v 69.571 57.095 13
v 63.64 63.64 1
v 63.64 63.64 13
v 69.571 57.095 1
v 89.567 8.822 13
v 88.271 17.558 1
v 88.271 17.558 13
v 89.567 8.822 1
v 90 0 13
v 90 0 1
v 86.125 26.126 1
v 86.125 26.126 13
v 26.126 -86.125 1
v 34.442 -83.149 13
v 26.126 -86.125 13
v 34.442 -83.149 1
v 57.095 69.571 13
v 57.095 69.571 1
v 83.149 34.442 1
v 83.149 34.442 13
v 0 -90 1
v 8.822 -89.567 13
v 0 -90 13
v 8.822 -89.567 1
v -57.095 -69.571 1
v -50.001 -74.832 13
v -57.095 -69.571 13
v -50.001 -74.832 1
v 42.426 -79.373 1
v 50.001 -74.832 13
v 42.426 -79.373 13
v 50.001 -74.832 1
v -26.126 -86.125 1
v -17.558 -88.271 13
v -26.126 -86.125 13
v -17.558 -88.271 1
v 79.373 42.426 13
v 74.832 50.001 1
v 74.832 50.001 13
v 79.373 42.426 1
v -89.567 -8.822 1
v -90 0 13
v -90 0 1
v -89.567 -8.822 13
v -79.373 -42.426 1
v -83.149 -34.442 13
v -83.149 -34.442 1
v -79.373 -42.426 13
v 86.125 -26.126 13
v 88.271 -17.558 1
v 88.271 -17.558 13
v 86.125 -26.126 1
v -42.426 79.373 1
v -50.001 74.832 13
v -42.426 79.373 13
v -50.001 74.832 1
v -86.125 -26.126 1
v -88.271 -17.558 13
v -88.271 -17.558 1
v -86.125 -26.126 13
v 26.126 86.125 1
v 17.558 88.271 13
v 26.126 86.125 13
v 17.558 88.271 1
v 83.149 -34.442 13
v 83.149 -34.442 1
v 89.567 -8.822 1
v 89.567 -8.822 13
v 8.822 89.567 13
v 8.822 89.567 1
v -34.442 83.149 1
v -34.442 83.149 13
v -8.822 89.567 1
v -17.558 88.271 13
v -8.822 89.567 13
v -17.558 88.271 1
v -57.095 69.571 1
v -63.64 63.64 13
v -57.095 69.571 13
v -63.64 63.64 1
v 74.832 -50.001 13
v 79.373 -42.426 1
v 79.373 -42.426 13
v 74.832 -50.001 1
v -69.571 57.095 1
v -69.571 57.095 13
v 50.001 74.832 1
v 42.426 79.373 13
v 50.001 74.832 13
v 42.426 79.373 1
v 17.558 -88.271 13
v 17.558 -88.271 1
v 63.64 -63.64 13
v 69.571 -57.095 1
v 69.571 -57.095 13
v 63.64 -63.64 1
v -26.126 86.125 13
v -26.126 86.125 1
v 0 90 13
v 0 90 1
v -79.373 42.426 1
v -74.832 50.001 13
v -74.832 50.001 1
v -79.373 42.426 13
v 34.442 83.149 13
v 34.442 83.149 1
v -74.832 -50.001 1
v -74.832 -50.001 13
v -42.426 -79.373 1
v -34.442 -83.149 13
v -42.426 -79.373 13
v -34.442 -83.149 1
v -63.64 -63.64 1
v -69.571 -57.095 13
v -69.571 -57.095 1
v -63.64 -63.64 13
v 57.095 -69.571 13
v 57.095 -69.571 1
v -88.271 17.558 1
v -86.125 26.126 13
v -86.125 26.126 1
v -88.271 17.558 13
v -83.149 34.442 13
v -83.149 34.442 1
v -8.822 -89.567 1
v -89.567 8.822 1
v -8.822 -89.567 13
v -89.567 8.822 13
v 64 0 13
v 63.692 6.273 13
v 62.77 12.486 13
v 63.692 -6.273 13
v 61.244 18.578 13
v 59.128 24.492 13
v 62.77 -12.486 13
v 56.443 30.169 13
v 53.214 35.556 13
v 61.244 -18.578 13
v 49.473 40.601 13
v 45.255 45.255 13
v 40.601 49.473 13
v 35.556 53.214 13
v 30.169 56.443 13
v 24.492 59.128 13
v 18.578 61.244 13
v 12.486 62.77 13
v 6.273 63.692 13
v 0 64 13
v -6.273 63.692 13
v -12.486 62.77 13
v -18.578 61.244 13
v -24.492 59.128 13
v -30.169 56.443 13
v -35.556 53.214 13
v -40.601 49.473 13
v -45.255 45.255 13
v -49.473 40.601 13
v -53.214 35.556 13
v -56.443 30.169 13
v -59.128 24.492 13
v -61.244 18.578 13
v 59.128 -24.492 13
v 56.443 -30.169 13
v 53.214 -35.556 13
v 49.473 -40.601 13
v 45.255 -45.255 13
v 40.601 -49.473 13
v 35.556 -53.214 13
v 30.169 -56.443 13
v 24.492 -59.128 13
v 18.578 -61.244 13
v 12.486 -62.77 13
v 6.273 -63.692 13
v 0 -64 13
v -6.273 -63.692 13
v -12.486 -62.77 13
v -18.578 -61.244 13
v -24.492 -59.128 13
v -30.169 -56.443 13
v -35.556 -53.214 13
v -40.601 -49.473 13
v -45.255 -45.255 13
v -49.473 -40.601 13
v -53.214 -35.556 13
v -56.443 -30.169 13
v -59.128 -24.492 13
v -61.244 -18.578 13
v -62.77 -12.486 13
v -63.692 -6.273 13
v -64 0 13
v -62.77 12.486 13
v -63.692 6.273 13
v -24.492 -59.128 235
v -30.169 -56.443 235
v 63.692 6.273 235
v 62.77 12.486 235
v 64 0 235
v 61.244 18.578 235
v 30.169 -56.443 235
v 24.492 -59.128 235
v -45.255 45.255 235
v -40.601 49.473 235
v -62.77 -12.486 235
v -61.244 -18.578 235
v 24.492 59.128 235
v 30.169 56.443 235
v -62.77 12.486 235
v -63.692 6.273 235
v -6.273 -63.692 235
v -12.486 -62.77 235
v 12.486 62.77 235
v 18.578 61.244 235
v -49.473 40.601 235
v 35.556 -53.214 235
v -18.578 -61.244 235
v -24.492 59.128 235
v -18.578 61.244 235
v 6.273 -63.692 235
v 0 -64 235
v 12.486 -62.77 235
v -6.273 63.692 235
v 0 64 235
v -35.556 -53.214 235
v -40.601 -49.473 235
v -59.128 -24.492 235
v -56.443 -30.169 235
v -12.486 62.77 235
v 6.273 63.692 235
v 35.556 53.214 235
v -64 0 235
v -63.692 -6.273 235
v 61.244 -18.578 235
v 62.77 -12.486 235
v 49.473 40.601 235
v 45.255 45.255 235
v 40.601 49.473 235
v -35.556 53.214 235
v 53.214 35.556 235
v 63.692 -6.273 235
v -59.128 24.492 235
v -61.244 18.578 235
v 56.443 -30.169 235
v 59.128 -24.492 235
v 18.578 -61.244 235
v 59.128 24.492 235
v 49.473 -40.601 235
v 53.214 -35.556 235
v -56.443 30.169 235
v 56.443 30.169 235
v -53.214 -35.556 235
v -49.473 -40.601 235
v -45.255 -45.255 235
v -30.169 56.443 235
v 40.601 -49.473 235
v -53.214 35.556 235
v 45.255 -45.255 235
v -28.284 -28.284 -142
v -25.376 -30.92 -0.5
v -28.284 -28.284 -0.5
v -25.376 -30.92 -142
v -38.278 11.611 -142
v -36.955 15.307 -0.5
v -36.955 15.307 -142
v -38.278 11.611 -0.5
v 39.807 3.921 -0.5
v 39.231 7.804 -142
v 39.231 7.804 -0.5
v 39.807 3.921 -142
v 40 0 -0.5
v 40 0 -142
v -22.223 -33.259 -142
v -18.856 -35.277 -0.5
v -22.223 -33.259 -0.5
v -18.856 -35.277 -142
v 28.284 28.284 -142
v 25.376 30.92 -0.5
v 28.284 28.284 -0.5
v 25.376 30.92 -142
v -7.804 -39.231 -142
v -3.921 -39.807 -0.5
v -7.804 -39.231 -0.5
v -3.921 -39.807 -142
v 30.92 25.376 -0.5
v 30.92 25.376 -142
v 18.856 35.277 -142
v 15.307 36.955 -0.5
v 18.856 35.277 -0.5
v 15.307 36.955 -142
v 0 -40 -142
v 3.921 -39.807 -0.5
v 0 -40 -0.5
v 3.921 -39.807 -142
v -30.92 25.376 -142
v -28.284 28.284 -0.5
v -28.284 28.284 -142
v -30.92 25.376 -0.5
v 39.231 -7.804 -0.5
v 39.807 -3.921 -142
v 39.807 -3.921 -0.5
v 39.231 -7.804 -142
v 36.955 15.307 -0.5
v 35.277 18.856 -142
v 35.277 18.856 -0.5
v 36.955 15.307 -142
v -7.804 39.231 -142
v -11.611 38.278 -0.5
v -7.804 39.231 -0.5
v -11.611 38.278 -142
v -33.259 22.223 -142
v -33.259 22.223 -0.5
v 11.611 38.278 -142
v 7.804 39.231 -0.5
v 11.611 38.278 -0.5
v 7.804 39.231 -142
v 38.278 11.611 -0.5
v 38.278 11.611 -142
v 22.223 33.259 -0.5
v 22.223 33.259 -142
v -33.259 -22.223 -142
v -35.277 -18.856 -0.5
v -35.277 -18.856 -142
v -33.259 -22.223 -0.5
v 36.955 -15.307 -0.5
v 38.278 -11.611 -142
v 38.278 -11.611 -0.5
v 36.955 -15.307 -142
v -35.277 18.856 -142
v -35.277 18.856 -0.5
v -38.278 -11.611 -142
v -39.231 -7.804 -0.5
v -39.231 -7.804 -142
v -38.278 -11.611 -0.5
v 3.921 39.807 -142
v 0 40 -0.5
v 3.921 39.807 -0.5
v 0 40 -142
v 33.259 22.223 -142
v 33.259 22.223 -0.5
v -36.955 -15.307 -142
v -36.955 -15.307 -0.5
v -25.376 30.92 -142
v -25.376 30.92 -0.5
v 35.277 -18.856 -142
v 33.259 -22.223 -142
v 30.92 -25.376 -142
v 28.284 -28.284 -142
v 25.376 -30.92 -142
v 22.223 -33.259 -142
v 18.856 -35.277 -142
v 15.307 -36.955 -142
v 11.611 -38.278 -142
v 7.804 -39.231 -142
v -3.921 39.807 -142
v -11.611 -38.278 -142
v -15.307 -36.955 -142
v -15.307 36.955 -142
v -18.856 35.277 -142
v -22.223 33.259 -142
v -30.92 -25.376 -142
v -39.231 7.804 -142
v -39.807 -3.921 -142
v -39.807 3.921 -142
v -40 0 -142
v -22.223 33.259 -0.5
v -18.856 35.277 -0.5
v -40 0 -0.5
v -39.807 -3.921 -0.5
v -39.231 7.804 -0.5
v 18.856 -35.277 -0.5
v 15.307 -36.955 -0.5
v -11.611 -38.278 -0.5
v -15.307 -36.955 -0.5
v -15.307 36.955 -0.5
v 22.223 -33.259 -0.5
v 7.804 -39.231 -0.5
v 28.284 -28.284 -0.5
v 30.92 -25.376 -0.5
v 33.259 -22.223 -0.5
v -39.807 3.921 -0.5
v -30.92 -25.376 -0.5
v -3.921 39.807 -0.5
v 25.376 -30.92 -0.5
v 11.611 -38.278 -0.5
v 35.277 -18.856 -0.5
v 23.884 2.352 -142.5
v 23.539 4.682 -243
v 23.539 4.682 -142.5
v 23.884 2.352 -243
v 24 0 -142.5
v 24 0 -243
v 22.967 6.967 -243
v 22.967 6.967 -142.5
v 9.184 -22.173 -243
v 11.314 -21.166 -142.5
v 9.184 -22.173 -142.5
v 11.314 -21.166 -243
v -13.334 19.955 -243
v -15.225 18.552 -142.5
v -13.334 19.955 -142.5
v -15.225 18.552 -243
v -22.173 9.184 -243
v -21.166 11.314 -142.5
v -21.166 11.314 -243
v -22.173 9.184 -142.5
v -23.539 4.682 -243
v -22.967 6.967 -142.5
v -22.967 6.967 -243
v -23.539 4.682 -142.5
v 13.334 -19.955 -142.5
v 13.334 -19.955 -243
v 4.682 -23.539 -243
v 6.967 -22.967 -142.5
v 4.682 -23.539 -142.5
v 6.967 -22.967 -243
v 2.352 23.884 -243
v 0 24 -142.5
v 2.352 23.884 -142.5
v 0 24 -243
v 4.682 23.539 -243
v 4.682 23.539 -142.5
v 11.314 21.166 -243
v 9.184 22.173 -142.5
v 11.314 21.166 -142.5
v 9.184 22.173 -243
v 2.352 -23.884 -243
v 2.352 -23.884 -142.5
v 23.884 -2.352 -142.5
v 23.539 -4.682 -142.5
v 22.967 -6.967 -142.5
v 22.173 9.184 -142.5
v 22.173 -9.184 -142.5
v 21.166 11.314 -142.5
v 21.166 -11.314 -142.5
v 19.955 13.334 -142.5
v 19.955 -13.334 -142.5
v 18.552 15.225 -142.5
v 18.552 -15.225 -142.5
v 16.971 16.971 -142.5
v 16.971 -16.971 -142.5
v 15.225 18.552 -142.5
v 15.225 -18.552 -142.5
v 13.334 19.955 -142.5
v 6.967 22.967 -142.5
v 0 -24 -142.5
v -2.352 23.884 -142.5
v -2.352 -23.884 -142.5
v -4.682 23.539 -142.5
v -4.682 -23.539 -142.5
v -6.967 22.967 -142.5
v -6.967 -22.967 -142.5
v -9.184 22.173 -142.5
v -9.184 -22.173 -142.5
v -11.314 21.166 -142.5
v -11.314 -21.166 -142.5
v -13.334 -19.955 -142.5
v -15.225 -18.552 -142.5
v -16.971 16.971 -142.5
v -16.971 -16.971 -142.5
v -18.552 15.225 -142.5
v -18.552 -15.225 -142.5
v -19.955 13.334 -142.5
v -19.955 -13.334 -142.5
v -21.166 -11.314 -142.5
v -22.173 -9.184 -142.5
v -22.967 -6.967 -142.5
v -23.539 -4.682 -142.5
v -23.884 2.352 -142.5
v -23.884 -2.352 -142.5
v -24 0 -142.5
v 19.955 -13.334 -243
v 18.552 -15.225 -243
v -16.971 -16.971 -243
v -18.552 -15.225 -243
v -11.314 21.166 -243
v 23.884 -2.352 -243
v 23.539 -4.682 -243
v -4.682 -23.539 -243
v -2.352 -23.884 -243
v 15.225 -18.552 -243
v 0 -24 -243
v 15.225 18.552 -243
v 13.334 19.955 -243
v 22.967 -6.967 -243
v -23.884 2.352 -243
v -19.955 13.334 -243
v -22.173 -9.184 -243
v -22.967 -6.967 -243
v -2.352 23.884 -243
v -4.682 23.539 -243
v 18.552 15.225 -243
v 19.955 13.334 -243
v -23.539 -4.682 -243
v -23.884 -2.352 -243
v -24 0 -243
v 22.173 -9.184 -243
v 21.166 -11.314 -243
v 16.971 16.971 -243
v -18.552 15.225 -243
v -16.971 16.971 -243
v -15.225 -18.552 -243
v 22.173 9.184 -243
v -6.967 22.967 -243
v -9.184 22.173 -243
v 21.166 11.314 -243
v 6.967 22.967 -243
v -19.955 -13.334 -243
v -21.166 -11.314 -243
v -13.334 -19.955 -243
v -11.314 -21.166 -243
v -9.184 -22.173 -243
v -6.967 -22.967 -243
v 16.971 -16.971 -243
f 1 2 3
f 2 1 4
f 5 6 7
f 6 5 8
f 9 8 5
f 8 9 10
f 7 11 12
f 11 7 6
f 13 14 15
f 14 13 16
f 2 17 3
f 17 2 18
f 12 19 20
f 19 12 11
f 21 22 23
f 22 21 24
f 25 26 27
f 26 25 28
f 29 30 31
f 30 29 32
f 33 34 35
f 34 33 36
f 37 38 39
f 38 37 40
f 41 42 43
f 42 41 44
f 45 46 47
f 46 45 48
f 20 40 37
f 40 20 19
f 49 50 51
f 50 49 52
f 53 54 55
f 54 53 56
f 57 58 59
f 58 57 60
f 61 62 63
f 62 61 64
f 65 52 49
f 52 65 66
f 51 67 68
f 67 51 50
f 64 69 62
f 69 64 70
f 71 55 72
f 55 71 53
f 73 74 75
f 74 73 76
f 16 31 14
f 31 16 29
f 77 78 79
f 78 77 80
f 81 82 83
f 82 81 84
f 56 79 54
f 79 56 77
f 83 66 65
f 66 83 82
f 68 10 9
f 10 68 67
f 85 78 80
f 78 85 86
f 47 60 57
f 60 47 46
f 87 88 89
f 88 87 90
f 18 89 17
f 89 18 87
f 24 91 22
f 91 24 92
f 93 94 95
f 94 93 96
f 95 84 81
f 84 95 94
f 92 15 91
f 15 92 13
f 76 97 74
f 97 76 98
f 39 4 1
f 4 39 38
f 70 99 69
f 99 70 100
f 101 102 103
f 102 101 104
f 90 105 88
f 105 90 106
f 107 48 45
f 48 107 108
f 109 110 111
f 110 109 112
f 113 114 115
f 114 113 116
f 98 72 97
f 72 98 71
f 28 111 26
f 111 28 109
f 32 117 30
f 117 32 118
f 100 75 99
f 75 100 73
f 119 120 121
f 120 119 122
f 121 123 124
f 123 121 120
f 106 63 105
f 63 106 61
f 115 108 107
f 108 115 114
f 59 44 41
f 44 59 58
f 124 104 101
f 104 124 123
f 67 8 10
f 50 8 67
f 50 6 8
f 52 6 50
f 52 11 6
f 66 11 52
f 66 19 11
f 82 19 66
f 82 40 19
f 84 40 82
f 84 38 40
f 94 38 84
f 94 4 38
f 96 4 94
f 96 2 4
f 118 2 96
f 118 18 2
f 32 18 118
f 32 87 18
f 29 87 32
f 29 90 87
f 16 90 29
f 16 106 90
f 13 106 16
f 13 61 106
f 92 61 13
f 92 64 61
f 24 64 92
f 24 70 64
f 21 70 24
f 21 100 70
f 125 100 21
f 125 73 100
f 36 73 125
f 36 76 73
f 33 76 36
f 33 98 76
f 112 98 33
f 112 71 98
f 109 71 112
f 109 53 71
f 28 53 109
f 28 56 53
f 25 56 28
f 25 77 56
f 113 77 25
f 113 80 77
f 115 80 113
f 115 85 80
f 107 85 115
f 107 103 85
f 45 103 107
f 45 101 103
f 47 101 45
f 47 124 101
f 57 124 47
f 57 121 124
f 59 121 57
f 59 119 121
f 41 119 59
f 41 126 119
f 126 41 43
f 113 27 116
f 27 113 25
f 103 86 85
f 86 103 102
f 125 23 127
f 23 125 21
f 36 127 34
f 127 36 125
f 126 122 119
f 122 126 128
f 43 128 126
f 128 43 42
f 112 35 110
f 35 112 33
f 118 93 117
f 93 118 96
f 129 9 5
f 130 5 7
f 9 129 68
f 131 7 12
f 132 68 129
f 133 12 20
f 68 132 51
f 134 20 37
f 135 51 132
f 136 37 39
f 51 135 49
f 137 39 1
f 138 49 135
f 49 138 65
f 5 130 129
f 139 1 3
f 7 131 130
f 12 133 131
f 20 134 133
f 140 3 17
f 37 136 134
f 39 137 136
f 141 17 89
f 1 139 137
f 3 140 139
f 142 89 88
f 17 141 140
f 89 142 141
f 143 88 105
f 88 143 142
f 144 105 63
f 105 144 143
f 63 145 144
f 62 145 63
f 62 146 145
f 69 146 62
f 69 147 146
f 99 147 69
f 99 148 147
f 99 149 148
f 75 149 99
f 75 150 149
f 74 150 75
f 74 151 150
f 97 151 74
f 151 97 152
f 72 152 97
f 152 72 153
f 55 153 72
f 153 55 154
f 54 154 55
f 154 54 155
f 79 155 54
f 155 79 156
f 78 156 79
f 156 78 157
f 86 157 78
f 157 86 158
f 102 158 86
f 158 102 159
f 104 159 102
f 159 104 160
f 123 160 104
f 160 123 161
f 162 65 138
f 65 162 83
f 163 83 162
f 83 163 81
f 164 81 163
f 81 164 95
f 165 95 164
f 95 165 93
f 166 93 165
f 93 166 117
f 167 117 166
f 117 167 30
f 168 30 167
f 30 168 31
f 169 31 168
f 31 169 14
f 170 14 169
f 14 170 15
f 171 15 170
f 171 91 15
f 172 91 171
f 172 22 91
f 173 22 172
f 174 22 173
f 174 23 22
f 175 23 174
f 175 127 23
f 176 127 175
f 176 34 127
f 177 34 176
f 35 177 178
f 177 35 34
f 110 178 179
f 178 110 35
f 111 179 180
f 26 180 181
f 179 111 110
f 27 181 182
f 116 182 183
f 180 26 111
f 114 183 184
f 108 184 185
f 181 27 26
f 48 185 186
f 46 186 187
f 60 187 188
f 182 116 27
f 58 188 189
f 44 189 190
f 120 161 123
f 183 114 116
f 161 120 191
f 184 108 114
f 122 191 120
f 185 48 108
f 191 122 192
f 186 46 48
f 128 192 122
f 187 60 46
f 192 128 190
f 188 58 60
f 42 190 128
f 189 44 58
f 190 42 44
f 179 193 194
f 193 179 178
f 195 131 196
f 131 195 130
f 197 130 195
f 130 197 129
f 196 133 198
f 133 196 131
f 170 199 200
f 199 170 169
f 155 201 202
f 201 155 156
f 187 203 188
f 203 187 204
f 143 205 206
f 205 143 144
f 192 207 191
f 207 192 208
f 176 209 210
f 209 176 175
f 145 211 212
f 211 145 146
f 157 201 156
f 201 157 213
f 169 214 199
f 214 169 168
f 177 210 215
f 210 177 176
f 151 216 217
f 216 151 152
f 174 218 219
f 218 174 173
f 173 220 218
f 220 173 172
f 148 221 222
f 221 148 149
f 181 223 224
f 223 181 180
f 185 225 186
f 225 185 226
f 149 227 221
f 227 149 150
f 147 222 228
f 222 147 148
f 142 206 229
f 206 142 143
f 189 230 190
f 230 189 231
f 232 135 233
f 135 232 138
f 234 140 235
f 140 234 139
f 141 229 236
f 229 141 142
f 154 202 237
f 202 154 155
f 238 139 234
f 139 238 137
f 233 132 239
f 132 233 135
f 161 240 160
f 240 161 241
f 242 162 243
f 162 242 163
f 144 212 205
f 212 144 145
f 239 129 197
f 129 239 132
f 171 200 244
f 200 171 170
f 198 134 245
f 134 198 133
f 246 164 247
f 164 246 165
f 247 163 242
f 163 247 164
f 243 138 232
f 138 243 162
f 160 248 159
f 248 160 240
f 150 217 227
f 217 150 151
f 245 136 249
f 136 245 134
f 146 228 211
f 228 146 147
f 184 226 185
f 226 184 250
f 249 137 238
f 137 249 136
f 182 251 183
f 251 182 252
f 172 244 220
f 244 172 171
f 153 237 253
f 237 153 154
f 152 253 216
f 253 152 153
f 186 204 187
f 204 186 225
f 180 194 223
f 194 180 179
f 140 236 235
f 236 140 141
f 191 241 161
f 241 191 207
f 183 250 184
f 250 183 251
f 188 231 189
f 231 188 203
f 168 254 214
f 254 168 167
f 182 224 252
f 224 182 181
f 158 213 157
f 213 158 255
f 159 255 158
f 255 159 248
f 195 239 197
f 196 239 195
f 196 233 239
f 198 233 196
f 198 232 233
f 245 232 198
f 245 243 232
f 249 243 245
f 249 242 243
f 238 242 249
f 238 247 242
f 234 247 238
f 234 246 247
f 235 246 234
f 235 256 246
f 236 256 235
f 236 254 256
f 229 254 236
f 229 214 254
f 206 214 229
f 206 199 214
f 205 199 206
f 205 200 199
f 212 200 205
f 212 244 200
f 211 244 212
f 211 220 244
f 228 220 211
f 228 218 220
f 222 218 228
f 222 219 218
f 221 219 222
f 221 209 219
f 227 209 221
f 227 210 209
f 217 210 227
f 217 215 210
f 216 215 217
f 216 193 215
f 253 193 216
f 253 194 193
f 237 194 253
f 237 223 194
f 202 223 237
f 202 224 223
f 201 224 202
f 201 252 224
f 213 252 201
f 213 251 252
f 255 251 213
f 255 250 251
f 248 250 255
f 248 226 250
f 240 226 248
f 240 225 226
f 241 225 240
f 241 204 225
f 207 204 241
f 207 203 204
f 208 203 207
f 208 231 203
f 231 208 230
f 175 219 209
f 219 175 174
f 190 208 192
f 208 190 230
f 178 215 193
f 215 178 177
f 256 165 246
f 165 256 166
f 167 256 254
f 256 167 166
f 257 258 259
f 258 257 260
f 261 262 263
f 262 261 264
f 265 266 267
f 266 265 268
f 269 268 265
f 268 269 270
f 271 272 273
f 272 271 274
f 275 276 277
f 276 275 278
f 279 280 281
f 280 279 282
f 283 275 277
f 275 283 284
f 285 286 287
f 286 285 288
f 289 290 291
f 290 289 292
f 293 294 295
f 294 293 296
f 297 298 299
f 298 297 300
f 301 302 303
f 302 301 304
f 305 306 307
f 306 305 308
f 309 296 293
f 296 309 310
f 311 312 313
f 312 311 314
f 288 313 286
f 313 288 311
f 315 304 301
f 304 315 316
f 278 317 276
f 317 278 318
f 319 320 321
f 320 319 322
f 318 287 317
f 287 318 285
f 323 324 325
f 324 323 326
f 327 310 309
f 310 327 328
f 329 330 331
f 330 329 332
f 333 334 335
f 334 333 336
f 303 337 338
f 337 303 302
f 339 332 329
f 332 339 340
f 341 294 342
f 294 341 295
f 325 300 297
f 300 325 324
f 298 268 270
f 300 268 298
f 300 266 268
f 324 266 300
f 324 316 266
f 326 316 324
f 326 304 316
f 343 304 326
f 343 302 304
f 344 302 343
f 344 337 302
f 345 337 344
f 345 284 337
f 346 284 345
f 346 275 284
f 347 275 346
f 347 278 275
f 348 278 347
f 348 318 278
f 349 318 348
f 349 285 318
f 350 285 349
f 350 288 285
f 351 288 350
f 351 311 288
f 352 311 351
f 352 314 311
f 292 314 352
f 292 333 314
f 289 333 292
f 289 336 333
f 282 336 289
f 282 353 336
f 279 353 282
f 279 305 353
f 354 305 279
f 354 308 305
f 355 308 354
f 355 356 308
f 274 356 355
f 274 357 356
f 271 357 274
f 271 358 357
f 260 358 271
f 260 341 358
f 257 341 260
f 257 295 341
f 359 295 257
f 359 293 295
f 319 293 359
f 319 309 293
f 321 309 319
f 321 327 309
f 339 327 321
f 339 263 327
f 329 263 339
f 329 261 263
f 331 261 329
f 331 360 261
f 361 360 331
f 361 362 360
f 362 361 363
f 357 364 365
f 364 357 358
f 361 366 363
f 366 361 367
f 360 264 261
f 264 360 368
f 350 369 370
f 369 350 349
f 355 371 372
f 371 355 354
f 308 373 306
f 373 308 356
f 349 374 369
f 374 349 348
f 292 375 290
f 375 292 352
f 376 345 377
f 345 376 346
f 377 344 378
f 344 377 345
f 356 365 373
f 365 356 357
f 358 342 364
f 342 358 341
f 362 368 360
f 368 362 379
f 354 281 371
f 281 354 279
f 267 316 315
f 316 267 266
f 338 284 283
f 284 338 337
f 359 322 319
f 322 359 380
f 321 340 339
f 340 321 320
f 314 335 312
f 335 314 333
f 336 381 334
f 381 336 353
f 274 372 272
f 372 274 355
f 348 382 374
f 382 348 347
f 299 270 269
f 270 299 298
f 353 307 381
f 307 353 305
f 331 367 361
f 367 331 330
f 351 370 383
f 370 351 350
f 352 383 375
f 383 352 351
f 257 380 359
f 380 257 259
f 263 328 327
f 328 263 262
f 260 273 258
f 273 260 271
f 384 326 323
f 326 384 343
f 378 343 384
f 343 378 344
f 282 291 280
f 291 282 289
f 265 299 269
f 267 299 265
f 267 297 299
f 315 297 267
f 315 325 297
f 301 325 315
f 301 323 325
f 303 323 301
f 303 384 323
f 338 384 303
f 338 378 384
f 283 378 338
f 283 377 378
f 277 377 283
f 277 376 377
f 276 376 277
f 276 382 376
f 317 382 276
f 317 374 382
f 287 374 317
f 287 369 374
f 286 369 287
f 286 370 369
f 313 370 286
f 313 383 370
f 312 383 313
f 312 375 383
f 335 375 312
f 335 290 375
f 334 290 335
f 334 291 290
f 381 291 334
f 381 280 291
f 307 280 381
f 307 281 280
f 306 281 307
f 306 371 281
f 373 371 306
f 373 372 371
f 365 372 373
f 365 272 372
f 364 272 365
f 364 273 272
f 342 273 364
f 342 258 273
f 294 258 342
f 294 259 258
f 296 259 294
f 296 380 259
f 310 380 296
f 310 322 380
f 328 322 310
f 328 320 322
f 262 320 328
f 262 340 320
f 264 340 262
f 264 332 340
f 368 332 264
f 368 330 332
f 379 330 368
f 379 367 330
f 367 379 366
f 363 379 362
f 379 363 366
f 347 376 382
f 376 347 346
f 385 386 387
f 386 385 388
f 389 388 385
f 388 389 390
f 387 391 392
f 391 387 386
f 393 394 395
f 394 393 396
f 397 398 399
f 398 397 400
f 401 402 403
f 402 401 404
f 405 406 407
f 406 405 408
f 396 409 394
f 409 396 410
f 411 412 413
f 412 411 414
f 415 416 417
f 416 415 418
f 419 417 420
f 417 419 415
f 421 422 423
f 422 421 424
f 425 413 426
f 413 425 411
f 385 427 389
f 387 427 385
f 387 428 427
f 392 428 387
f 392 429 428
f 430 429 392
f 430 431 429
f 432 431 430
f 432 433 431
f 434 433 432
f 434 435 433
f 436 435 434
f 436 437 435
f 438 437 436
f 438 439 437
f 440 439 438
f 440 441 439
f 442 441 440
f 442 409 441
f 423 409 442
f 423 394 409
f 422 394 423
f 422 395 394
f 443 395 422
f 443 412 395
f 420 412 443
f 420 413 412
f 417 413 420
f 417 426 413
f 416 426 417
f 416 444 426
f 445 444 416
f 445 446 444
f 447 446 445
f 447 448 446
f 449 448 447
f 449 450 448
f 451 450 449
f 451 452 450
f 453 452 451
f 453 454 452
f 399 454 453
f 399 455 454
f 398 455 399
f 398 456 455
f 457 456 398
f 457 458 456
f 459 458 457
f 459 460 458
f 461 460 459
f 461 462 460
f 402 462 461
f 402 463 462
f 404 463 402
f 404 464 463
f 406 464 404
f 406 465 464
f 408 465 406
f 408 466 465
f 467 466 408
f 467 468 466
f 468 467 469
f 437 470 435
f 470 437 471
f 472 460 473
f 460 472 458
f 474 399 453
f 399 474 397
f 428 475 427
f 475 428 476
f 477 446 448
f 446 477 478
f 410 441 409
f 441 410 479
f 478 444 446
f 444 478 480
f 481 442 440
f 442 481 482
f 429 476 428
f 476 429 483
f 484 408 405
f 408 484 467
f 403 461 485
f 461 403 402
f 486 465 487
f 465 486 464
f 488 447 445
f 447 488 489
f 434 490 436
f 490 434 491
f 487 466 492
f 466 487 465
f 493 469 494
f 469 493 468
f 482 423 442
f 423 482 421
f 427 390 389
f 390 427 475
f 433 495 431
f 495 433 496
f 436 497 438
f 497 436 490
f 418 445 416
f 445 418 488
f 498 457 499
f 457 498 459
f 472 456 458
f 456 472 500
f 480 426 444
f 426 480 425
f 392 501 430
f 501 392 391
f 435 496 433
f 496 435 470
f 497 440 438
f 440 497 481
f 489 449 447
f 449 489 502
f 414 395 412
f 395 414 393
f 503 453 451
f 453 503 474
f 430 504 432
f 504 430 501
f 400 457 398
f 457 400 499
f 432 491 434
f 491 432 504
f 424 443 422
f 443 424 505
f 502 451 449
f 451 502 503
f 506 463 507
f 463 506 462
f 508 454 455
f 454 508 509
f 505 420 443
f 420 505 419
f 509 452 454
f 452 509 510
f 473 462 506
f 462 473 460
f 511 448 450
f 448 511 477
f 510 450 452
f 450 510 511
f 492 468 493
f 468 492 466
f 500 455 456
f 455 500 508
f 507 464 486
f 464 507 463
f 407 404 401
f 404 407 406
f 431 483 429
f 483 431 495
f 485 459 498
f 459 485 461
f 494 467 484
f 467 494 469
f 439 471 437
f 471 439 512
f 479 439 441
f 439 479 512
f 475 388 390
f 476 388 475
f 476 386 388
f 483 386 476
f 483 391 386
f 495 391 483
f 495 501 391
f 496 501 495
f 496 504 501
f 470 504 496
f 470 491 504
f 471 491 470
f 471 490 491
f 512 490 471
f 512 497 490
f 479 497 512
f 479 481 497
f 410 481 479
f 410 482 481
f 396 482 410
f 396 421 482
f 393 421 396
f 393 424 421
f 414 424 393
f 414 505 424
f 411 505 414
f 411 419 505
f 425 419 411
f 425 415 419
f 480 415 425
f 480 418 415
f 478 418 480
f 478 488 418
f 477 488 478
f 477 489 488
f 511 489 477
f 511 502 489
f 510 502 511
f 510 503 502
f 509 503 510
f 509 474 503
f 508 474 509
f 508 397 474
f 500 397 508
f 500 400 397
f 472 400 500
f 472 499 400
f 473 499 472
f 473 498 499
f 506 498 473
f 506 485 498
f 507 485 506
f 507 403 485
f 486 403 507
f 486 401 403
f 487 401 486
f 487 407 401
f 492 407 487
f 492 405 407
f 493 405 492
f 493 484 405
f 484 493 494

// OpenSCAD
// ============================================================================
// Atom Lithography Machine — Parametric OpenSCAD Module (S6.1-01)
// ============================================================================
// part_id           : S6.1-01
// parent_bom_id     : S6.1
// subsystem         : S6
// part_name         : Kapali cevrim 4 K pulse-tube sogutucu (PT420 2.0 W @ 4.2 K sinifi, yeni)
// material          : 316LN
// temp_stage        : 50 K / 4 K
// vacuum_grade      : Kriyo-vakum
// tolerance         : ±0.05 K
// computed_mass_kg  : 10.37608
// envelope_mm       : 180.000 x 180.000 x 478.000
// design_maturity   : M0_M1_DETAILED_CAD_DESIGN_ONLY
// no_lab_measurement: true
// iec61508_certified: false
// semi_s2_certified : false
// Units: millimeters (mm)
// ============================================================================

$fn = 64;

// Nominal bounding envelope parameters (mm)
bbox_x = 180.0000;
bbox_y = 180.0000;
bbox_z = 478.0000;

// Part-specific parametric dimensions
head_od = 128.0;
stage1_od = 80.0;
stage2_od = 48.0;
cooling_4k_w = 2.0;

// Interface / port parameters (mm)
port_dr_top_isok_od = 180.000;
port_dr_top_isok_bore = 153.000;
port_dr_top_isok_bolts = 4;
port_he_flex_inlet_od = 28.000;
port_he_flex_inlet_bore = 16.000;
port_thermal_45k_od = 80.000;
port_thermal_4k_od = 48.000;

module part_S6_1_01() {
  union() {
    // ISO-K DN160 flange
    translate([0.000, 0.000, 7.000]) cylinder(d=180.000, h=12.000, center=true);
    // PT420 300K reservoir
    translate([0.000, 0.000, 124.000]) cylinder(d=128.000, h=222.000, center=true);
    // 45 K 1st stage
    translate([0.000, 0.000, -71.250]) cylinder(d=80.000, h=141.500, center=true);
    // 4.2 K 2nd stage
    translate([0.000, 0.000, -192.750]) cylinder(d=48.000, h=100.500, center=true);
  }
}

// World assembly mounting transform (global machine frame, mm / deg):
// translate([-650.000, 0.000, 985.000]) rotate([0.000, 0.000, 0.000]) part_S6_1_01();

part_S6_1_01();
